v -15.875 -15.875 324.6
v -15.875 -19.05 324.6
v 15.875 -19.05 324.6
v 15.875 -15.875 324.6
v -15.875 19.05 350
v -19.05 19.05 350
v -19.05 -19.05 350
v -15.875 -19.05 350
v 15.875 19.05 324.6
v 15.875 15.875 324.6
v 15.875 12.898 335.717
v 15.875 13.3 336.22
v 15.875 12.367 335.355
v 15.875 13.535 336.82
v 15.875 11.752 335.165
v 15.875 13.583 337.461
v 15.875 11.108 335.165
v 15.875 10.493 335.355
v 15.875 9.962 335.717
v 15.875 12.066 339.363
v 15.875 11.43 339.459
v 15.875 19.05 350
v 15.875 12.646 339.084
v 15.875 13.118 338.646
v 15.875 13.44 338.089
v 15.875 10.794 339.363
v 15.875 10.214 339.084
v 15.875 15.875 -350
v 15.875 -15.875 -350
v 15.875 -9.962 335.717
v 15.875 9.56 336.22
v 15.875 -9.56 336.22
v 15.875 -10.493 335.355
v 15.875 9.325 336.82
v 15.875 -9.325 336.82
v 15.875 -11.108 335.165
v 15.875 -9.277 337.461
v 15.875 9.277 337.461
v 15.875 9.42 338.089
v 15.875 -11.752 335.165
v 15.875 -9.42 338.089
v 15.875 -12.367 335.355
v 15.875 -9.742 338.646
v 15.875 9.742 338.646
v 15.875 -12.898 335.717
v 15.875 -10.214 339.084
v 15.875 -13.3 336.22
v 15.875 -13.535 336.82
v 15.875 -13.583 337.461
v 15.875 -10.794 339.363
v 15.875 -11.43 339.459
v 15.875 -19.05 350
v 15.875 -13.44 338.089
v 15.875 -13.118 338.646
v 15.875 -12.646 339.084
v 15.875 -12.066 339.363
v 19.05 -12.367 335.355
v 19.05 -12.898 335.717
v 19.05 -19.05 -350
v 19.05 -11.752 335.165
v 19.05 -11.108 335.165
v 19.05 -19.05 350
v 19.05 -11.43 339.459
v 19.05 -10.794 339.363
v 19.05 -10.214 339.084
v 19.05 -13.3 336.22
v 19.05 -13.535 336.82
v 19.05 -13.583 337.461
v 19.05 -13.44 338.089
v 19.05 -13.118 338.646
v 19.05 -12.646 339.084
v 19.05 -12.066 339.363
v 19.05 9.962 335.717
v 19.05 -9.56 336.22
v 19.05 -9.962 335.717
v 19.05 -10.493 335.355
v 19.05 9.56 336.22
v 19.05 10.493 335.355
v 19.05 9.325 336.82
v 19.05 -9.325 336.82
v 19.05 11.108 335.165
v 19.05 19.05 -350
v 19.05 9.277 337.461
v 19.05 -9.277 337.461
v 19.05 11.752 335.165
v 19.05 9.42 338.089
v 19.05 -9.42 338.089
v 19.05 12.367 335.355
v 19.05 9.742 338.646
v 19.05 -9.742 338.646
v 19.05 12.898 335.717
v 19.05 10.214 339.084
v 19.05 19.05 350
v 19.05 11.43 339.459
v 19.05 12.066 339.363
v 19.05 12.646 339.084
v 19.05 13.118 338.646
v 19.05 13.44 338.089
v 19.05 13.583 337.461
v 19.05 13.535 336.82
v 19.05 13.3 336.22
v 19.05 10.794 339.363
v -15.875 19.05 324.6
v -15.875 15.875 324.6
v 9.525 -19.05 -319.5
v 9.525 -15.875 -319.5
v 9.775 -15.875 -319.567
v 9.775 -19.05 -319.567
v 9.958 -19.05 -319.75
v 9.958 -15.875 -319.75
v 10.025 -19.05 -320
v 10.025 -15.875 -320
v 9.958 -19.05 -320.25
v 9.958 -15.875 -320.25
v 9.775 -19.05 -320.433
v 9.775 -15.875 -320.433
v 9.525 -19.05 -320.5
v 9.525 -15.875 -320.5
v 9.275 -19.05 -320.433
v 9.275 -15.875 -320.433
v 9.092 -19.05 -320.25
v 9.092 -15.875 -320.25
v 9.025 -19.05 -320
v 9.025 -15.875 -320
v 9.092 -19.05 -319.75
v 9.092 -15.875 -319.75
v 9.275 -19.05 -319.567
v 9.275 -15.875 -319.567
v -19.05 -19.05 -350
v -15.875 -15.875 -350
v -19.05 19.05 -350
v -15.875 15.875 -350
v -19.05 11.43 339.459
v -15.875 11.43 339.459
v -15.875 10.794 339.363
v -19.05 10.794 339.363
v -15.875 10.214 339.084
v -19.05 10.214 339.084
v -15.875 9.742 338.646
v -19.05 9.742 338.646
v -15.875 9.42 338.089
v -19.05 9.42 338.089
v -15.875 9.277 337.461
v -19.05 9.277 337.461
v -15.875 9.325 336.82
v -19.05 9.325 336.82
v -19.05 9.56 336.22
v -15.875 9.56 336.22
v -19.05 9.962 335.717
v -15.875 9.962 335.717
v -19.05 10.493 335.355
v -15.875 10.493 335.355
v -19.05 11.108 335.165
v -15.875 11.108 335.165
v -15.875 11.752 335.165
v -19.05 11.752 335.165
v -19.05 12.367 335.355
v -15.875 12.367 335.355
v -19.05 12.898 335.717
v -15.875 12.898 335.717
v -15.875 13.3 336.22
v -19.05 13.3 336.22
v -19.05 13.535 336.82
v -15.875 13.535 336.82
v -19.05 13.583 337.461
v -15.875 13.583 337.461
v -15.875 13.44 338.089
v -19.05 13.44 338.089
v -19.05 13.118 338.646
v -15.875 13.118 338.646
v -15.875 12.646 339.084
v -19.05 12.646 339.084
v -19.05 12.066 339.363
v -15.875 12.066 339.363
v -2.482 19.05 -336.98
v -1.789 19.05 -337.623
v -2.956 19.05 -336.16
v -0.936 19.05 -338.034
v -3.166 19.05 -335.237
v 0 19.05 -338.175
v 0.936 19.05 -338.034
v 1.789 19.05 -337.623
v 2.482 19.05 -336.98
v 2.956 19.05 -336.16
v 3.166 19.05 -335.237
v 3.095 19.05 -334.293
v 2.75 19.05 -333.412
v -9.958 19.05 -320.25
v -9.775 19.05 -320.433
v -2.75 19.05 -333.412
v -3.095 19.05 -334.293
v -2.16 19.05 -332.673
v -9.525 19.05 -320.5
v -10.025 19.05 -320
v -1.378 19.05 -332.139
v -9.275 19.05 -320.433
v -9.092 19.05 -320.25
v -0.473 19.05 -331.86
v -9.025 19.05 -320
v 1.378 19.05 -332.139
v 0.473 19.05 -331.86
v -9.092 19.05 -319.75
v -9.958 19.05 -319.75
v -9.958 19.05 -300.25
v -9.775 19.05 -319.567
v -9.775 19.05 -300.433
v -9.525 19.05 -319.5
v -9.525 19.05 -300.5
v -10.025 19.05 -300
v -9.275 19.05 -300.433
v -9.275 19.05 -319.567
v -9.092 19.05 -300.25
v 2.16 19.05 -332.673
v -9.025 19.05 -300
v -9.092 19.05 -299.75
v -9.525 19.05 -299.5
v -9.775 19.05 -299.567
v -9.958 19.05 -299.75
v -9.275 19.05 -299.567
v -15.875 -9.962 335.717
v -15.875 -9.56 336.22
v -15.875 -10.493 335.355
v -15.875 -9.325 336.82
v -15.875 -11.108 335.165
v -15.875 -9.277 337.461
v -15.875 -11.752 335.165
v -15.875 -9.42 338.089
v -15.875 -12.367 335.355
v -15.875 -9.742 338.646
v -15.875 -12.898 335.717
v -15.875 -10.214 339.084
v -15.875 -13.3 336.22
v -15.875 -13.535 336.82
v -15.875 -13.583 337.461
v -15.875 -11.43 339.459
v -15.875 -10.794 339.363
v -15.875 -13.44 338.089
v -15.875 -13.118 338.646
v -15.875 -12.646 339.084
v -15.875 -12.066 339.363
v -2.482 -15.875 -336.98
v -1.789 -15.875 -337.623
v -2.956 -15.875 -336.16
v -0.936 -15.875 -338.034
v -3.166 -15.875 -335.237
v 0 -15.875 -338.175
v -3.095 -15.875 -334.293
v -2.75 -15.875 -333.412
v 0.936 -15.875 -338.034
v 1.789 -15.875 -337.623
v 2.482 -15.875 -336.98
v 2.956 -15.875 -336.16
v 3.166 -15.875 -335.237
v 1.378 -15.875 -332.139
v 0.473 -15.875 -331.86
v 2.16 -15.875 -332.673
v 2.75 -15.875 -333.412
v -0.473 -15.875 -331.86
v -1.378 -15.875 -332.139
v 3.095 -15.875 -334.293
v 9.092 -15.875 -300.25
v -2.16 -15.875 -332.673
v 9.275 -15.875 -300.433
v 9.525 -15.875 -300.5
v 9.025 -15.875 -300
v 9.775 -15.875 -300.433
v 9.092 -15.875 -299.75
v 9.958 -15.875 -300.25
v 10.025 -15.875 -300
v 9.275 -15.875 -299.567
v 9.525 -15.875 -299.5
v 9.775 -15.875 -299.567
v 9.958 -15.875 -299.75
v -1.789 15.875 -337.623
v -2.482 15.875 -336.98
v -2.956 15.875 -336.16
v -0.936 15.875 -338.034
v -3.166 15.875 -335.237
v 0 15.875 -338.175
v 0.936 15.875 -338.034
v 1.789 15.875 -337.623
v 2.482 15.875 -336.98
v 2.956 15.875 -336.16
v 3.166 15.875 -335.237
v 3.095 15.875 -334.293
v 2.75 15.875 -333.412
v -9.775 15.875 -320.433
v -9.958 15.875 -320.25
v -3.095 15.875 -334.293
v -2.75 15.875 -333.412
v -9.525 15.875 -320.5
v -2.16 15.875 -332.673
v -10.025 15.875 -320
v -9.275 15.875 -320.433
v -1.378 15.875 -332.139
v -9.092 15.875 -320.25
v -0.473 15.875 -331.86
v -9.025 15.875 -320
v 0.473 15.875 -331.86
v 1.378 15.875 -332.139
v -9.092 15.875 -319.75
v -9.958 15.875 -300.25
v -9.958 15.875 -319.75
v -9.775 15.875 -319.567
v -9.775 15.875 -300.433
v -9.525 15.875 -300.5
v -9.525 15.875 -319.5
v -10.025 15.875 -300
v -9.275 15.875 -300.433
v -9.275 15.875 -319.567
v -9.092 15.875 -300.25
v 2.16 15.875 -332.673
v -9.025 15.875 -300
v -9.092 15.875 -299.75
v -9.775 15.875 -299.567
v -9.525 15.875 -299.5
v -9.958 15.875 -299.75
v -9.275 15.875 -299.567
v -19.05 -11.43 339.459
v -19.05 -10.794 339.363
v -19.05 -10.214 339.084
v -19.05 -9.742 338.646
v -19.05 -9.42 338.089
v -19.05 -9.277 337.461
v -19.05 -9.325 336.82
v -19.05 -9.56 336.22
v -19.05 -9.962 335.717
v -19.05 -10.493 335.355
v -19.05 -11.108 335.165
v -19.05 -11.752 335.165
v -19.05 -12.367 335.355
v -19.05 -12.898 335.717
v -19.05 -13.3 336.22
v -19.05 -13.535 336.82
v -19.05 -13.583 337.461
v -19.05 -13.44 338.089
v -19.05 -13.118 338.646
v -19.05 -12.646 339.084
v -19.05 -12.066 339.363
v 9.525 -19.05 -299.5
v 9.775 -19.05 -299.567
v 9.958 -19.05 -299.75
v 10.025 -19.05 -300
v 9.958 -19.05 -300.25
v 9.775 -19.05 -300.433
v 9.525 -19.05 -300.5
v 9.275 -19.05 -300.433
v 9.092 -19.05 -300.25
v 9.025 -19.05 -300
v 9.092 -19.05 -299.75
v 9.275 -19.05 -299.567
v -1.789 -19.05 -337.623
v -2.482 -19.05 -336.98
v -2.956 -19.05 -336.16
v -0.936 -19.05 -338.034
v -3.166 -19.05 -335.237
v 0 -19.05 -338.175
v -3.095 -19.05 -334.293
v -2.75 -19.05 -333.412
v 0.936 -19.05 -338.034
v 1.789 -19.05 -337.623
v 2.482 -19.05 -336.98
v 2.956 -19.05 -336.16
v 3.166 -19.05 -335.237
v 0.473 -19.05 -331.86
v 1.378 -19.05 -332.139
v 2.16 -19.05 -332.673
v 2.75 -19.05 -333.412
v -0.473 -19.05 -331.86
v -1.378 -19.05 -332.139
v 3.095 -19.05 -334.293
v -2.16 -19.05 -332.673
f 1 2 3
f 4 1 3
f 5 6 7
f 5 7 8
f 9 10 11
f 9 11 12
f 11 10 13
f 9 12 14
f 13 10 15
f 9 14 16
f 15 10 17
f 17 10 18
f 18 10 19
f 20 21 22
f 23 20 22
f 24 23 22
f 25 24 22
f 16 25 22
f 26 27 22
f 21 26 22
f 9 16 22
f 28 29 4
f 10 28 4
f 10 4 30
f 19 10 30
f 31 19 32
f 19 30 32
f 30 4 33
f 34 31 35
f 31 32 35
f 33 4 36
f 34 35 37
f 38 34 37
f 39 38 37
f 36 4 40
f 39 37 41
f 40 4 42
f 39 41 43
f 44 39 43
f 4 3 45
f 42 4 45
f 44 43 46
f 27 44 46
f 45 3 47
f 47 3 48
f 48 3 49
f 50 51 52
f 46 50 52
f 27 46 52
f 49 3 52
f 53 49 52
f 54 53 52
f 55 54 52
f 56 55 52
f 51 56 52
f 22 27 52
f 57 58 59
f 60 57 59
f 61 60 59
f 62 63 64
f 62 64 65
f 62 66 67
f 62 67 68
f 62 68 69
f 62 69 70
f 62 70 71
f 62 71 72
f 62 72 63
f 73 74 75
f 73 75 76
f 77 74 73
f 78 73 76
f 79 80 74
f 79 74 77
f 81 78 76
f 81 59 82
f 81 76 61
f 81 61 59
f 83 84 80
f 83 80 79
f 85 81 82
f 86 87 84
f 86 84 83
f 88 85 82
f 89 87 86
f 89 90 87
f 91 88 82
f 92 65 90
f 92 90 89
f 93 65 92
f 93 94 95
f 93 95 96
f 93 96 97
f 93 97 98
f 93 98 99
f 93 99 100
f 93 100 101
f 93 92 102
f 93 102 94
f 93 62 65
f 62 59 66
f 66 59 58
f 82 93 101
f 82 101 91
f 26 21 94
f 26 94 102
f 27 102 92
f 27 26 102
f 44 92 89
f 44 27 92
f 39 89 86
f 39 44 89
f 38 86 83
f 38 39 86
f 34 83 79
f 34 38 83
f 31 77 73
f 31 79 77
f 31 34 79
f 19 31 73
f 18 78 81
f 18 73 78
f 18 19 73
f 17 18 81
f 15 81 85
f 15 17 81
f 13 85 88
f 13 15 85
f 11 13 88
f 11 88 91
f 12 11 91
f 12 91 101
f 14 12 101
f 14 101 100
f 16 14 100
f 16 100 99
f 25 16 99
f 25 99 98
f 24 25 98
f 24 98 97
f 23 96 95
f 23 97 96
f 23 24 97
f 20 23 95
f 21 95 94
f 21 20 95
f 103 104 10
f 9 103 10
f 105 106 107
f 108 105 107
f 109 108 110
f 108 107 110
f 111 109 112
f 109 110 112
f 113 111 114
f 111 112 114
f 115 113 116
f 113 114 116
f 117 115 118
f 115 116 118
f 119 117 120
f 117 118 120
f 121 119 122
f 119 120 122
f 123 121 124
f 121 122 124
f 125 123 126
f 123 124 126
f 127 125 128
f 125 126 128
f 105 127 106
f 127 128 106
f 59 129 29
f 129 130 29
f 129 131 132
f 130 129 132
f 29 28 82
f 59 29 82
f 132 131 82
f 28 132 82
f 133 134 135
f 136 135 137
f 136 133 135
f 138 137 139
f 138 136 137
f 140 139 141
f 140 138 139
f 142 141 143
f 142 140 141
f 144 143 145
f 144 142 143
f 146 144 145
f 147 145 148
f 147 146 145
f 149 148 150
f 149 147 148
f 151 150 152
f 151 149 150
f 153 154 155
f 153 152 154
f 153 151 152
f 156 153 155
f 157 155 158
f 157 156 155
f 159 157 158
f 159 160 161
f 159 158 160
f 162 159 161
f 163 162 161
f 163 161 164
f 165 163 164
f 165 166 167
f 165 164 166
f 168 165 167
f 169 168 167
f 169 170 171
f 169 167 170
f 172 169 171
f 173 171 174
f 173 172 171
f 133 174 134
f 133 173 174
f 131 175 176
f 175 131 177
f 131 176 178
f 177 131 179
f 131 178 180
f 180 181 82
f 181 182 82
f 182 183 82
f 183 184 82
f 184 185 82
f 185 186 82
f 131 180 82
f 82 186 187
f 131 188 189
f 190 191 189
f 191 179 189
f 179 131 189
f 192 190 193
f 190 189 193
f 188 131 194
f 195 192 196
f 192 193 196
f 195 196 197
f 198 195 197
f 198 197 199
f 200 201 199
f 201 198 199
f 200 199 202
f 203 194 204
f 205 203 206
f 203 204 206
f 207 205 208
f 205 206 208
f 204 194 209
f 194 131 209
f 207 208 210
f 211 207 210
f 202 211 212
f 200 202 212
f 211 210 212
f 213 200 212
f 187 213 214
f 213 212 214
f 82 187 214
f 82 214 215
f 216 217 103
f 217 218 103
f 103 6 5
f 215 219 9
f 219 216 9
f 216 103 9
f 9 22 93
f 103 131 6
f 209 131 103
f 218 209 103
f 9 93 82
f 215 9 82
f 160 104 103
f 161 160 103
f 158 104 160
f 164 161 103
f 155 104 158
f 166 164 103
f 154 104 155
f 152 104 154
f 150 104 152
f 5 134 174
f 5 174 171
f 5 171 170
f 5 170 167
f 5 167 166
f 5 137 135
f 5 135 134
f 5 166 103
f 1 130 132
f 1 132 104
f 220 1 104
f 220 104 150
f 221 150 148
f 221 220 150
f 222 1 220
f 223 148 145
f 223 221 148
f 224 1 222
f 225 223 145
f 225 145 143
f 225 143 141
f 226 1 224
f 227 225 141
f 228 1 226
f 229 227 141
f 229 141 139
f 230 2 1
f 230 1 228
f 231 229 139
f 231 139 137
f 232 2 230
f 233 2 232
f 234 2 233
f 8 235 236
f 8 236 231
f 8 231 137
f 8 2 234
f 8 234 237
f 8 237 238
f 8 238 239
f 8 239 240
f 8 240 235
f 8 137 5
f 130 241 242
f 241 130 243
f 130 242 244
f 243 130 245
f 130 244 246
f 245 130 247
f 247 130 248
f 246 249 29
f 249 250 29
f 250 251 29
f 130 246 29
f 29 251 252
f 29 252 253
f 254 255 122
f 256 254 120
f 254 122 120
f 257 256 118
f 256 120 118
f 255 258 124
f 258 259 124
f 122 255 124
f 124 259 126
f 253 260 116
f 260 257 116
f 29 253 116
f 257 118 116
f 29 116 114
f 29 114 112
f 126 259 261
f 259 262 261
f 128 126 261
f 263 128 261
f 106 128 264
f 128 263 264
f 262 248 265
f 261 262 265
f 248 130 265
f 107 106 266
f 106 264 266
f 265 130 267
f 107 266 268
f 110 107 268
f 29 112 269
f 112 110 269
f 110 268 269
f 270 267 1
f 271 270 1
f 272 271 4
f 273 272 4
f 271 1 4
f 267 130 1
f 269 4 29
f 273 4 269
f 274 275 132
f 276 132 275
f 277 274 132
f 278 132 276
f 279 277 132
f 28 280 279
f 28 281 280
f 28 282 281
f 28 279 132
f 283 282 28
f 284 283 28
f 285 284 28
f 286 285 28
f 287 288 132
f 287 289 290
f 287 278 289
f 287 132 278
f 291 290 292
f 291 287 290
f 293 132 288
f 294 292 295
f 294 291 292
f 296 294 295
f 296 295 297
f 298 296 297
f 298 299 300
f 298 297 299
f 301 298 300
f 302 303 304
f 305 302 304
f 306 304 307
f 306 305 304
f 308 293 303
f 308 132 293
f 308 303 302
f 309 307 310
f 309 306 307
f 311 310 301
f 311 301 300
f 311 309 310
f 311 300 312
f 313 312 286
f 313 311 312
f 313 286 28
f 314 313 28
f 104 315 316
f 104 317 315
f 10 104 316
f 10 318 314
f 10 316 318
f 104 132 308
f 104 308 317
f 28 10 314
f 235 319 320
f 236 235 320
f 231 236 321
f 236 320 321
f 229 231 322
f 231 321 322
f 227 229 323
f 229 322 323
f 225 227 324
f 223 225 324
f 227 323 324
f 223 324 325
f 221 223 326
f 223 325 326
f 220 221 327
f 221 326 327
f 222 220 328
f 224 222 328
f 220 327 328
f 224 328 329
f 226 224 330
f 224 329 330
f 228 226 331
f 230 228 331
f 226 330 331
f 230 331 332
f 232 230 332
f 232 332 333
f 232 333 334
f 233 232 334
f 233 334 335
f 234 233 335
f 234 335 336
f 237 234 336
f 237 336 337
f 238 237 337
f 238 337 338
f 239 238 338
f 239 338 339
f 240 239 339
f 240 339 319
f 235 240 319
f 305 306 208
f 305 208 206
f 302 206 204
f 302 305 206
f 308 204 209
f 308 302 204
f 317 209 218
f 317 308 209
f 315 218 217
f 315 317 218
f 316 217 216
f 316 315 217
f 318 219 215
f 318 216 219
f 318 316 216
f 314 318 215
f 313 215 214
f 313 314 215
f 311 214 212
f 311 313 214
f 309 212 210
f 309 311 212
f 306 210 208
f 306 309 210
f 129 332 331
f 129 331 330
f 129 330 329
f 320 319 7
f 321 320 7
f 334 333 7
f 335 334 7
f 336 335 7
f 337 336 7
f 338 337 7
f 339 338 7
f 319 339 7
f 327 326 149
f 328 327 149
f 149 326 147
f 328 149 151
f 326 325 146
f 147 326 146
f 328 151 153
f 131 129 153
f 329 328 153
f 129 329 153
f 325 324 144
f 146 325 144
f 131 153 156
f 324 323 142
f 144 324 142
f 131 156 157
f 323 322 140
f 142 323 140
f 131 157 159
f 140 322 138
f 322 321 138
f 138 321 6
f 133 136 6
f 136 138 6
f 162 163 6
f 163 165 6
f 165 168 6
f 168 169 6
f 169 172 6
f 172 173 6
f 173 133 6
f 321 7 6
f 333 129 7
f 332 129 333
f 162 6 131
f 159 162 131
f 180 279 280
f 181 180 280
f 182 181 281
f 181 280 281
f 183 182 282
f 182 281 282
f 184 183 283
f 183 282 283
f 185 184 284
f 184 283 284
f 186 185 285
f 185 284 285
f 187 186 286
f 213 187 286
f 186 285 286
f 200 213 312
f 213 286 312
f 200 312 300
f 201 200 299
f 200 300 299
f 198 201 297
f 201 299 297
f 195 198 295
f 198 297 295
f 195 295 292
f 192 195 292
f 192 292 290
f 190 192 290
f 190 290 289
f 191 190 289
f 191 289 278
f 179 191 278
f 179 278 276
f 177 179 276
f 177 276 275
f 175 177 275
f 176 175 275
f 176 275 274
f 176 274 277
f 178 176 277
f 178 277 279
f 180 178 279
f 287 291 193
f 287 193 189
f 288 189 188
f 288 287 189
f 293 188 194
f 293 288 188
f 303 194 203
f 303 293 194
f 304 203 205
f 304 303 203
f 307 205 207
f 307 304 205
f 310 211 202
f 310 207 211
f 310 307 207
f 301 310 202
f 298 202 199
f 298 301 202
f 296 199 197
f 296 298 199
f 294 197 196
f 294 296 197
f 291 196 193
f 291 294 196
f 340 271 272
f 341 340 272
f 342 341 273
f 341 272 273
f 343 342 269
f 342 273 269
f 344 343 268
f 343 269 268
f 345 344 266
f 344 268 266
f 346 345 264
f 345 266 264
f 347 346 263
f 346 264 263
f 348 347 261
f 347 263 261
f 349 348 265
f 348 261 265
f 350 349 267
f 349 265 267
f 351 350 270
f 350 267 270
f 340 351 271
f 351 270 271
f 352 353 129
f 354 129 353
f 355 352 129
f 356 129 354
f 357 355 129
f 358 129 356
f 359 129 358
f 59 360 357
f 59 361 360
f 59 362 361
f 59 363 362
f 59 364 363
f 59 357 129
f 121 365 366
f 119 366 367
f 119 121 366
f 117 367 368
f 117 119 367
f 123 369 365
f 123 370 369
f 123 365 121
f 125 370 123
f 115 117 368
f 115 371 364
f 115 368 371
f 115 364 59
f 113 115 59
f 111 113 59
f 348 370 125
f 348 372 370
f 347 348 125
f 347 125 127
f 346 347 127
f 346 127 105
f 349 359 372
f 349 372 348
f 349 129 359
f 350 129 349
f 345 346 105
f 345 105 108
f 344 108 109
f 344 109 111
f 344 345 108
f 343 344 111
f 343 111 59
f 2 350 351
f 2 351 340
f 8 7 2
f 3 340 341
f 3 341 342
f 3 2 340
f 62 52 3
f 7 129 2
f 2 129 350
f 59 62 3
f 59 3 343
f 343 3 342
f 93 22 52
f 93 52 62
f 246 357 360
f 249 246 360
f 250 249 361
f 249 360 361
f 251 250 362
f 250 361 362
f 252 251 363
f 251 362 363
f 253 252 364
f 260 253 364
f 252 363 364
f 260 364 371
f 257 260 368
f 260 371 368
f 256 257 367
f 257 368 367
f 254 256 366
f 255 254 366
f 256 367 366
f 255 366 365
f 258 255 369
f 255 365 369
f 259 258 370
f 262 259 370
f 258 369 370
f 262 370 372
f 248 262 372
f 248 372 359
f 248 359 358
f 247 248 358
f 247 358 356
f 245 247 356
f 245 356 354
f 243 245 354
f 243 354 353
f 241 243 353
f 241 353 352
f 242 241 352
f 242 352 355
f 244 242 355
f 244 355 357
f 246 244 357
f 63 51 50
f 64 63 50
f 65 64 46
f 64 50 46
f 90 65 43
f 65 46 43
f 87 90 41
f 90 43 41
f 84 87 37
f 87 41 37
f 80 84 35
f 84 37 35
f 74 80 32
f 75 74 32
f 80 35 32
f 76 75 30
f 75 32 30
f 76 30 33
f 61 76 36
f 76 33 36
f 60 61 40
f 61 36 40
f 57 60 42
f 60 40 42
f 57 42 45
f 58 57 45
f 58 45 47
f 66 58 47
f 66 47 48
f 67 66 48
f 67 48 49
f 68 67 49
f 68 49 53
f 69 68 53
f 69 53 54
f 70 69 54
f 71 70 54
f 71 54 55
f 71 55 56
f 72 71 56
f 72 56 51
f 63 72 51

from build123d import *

# Parameters (mm, degrees)
ESQUISSE2_W             = 38.1
ESQUISSE2_H             = 38.1
ESQUISSE2_W_2           = 31.75
ESQUISSE2_H_2           = 31.75
BOSS_EXTRU_1_DEPTH      = 350
ESQUISSE3_R             = 2.159
ENL_V_MAT_EXTRU_1_DEPTH = 353.582632159
ESQUISSE4_W             = 31.75
ESQUISSE4_H             = 25.4
ENL_V_MAT_EXTRU_2_DEPTH = 353.582632159
ESQUISSE6_R             = 3.175
ENL_V_MAT_EXTRU_3_DEPTH = 353.582632159
ESQUISSE8_R             = 0.5
ENL_V_MAT_EXTRU_4_DEPTH = 352.035332979
ESQUISSE8_3_R           = 0.5
ENL_V_MAT_EXTRU_5_DEPTH = 352.035332979


with BuildPart() as part:
    # Esquisse2 → Boss.-Extru.1 (new, symmetric)
    with BuildSketch(Plane.XY):
        Rectangle(ESQUISSE2_W, ESQUISSE2_H)
        Rectangle(ESQUISSE2_W_2, ESQUISSE2_H_2, mode=Mode.SUBTRACT)
    extrude(amount=BOSS_EXTRU_1_DEPTH, both=True)

    # Esquisse3 → Enlèv. mat.-Extru.1 (cut, through all)
    with BuildSketch(Plane.ZY.offset(19.05)):
        with Locations((337.3, -11.43)):
            Circle(ESQUISSE3_R)
    enl_v_mat_extru_1 = extrude(amount=-ENL_V_MAT_EXTRU_1_DEPTH, mode=Mode.SUBTRACT)

    # Symétrie1: Enlèv. mat.-Extru.1 across plane
    add(enl_v_mat_extru_1.mirror(Plane.ZX), mode=Mode.SUBTRACT)

    # Esquisse4 → Enlèv. mat.-Extru.2 (cut, through all)
    with BuildSketch(Plane.XZ.offset(19.05)):
        with Locations((0, 337.3)):
            Rectangle(ESQUISSE4_W, ESQUISSE4_H)
    extrude(amount=-ENL_V_MAT_EXTRU_2_DEPTH, mode=Mode.SUBTRACT)

    # Esquisse6 → Enlèv. mat.-Extru.3 (cut, through all)
    with BuildSketch(Plane.XZ.offset(19.05)):
        with Locations((0, -335)):
            Circle(ESQUISSE6_R)
    extrude(amount=-ENL_V_MAT_EXTRU_3_DEPTH, mode=Mode.SUBTRACT)

    # Esquisse8 → Enlèv. mat.-Extru.4 (cut, through all)
    with BuildSketch(Plane(origin=(0, 0, 0), x_dir=(1, 0, 0), z_dir=(0, 1, 0))):
        with Locations((9.525, 320)):
            Circle(ESQUISSE8_R)
        with Locations((9.525, 300)):
            Circle(ESQUISSE8_R)
    extrude(amount=-ENL_V_MAT_EXTRU_4_DEPTH, mode=Mode.SUBTRACT)

    # Esquisse8<3> → Enlèv. mat.-Extru.5 (cut, through all)
    with BuildSketch(Plane(origin=(0, 0, 0), x_dir=(1, 0, 0), z_dir=(0, 1, 0))):
        with Locations((-9.525, 300)):
            Circle(ESQUISSE8_3_R)
        with Locations((-9.525, 320)):
            Circle(ESQUISSE8_3_R)
    extrude(amount=ENL_V_MAT_EXTRU_5_DEPTH, mode=Mode.SUBTRACT)


solid = part.part
